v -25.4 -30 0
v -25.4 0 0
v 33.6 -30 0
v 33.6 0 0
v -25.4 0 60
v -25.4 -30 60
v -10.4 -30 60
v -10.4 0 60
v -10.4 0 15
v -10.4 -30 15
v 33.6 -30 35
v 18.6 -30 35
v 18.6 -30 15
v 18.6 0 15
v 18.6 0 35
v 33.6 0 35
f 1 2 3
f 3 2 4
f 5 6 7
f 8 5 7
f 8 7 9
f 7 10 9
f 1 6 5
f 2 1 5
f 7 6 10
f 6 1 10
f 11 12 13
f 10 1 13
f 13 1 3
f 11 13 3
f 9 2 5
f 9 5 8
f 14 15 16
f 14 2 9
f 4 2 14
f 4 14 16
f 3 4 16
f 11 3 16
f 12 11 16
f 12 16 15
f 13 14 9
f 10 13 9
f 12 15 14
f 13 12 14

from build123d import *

# Parameters (mm, degrees)
F1_DEPTH  = 30
F1_FACE_W = 15
F1_FACE_H = 30
F2_DEPTH  = 25


with BuildPart() as f1:
    # F0 (on Front) → F1 (new body)
    with BuildSketch(Plane.XZ):
        Polygon((-25.400001, 0), (33.599999, 0), (33.599999, 35), (18.599999, 35), (18.599999, 15), (-10.400001, 15), (-10.400001, 35), (-25.400001, 35), align=None)
    extrude(amount=F1_DEPTH)

    # F1_face (on face) → F2 (join)
    with BuildSketch(Plane(origin=(-17.900001, -15, 35), x_dir=(1, 0, 0), z_dir=(0, 0, 1))):
        Rectangle(F1_FACE_W, F1_FACE_H)
    extrude(amount=F2_DEPTH)


solid = f1.part
